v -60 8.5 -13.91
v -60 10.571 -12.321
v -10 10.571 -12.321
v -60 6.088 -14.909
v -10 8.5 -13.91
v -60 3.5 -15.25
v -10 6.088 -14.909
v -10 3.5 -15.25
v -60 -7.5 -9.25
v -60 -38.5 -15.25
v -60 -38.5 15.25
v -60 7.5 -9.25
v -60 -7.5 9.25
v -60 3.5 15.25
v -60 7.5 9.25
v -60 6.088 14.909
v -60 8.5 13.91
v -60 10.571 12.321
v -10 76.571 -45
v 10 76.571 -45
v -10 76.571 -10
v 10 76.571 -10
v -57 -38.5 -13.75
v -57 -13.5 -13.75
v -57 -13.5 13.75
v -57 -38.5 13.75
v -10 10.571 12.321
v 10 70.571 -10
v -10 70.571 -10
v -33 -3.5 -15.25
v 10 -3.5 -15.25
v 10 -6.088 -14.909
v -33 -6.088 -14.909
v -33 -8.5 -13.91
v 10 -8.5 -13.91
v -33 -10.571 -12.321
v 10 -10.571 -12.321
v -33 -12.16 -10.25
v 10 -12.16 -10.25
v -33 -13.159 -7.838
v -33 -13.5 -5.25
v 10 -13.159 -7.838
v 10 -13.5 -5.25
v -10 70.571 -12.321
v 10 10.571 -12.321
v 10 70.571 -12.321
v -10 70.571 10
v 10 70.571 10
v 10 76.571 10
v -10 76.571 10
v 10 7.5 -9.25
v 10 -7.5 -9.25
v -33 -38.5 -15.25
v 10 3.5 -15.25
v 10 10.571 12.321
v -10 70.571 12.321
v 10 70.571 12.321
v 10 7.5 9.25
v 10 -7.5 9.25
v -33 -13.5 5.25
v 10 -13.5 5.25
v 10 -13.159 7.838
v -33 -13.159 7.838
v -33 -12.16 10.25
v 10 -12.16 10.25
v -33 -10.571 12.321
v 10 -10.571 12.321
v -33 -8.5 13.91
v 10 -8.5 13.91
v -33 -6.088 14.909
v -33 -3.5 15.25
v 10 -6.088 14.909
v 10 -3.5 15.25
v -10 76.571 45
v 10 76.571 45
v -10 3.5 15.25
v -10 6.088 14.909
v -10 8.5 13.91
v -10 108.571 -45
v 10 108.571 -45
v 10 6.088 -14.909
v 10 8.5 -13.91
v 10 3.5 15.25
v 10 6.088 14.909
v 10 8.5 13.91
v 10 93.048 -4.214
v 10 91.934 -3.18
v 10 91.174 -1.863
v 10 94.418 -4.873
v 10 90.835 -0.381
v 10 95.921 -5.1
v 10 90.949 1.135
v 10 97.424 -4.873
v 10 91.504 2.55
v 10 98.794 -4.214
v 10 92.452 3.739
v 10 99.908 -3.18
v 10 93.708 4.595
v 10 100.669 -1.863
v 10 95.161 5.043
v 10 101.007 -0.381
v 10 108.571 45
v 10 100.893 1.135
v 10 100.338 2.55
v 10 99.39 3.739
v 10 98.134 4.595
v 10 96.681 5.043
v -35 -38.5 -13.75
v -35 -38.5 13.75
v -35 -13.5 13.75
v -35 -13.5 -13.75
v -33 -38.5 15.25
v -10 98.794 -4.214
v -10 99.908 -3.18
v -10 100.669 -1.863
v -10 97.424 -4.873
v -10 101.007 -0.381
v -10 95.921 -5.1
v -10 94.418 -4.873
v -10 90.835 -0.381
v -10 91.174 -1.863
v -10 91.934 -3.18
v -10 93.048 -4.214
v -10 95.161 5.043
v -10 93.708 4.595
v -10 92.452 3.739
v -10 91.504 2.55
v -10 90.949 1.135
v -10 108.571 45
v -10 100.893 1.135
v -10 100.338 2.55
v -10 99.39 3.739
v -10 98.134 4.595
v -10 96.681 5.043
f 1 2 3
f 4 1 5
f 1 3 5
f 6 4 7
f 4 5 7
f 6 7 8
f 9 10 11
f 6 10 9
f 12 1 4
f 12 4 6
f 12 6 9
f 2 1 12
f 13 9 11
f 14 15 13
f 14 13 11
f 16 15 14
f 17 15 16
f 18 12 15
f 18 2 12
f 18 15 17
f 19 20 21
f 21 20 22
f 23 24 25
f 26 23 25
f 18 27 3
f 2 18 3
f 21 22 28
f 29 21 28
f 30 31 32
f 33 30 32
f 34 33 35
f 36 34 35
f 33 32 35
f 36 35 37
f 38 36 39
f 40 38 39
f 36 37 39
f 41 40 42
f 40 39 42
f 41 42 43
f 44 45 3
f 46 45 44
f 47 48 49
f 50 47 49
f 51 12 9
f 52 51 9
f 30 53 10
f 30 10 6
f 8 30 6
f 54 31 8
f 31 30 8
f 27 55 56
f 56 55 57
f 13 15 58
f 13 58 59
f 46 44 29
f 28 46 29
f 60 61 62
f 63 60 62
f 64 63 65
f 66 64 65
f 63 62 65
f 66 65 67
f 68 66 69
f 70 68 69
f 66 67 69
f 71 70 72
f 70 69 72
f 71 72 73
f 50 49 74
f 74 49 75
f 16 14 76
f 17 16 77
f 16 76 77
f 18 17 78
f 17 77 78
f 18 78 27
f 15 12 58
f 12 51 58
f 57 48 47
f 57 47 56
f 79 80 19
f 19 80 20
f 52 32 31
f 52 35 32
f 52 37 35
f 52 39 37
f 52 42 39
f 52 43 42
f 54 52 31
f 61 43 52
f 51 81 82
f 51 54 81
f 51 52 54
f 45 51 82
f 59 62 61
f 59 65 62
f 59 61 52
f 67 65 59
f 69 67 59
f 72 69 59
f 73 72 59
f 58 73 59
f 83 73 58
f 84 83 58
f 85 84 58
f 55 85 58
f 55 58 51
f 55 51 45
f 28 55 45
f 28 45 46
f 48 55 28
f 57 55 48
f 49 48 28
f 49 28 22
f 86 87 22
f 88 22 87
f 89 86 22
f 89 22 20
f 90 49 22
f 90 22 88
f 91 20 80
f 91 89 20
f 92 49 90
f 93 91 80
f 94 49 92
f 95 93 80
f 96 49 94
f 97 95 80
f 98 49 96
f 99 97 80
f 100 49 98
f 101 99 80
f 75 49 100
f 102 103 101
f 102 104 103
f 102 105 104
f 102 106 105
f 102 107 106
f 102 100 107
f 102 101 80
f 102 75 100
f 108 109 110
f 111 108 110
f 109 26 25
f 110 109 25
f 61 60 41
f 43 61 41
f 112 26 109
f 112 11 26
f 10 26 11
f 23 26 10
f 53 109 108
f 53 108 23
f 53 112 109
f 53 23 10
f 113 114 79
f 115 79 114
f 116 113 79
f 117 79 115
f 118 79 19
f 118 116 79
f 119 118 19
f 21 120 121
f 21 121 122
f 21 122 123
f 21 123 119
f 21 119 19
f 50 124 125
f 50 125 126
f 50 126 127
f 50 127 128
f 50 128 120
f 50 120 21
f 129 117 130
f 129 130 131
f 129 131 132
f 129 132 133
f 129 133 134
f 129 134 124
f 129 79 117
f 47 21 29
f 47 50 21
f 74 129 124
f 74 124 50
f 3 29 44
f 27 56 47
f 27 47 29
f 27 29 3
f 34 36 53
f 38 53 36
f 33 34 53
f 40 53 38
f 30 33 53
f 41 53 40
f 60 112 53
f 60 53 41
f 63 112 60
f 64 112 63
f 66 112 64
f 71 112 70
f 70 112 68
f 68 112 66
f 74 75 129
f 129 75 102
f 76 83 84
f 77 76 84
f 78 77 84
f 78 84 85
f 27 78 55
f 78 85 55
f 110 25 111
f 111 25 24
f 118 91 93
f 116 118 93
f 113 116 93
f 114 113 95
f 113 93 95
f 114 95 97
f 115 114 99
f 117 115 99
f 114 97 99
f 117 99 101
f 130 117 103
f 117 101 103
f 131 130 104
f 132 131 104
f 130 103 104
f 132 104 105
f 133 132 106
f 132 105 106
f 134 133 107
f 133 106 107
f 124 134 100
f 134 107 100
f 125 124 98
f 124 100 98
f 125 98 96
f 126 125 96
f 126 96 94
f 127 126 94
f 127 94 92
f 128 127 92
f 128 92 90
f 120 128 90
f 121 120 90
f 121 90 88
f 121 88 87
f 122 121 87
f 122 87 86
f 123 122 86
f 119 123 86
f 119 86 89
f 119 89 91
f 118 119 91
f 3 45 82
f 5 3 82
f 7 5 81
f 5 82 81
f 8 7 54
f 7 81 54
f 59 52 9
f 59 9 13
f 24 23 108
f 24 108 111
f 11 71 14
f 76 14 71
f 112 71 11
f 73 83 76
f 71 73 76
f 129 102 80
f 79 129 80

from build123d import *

# Parameters (mm, degrees)
SKETCH1_W            = 15
SKETCH1_H            = 18.5
BOSS_EXTRUDE1_DEPTH  = 10
SKETCH3_W            = 60
SKETCH3_H            = 24.642135624
BOSS_EXTRUDE2_DEPTH  = 20
BOSS_EXTRUDE3_DEPTH  = 20
SKETCH5_R            = 5.1
CUT_EXTRUDE1_DEPTH   = 120.21693154
SKETCH6_W            = 15
SKETCH6_H            = 18.5
BOSS_EXTRUDE4_DEPTH  = 50
BOSS_EXTRUDE5_DEPTH  = 25
SKETCH8_W            = 3
SKETCH8_H            = 30.5
BOSS_EXTRUDE6_DEPTH  = 25
SKETCH9_W            = 25
SKETCH9_H            = 1.5
BOSS_EXTRUDE7_DEPTH  = 22
BOSS_EXTRUDE11_START = 2
BOSS_EXTRUDE11_DEPTH = 2


with BuildPart() as part:
    # Sketch1 → Boss-Extrude1 (new, symmetric)
    with BuildSketch(Plane.YZ):
        with BuildLine():
            Line((13.5, 5.25), (13.5, -5.25))
            ThreePointArc((13.5, -5.25), (10.571067812, -12.321067812), (3.5, -15.25))
            Line((3.5, -15.25), (-3.5, -15.25))
            ThreePointArc((-3.5, -15.25), (-10.571067812, -12.321067812), (-13.5, -5.25))
            Line((-13.5, -5.25), (-13.5, 5.25))
            ThreePointArc((-13.5, 5.25), (-10.571067812, 12.321067812), (-3.5, 15.25))
            Line((-3.5, 15.25), (3.5, 15.25))
            ThreePointArc((3.5, 15.25), (10.571067812, 12.321067812), (13.5, 5.25))
        make_face()
        Rectangle(SKETCH1_W, SKETCH1_H, mode=Mode.SUBTRACT)
    extrude(amount=BOSS_EXTRUDE1_DEPTH, both=True)

    # Sketch3 → Boss-Extrude2 (add)
    with BuildSketch(Plane.YZ.offset(10)):
        with Locations((40.571067812, 0)):
            Rectangle(SKETCH3_W, SKETCH3_H)
    extrude(amount=-BOSS_EXTRUDE2_DEPTH)

    # Sketch4 → Boss-Extrude3 (add)
    with BuildSketch(Plane.YZ.offset(10)):
        Polygon((70.571067812, 10), (76.571067812, 10), (76.571067812, 45), (108.571067812, 45), (108.571067812, -45), (76.571067812, -45), (76.571067812, -10), (70.571067812, -10), align=None)
    extrude(amount=-BOSS_EXTRUDE3_DEPTH)

    # Sketch5 → Cut-Extrude1 (cut, through all)
    with BuildSketch(Plane.YZ.offset(10)):
        with Locations(Location((95.921067812, 0, 0), (0, 0, 270))):
            Circle(SKETCH5_R)
    extrude(amount=-CUT_EXTRUDE1_DEPTH, mode=Mode.SUBTRACT)

    # Sketch6 → Boss-Extrude4 (add)
    with BuildSketch(Plane(origin=(-10, 0, 0), x_dir=(0, -1, 0), z_dir=(-1, 0, 0))):
        with BuildLine():
            Line((-10.571067812, 12.321067812), (-10.571067812, -12.321067812))
            ThreePointArc((-10.571067812, -12.321067812), (-7.326834324, -14.488795325), (-3.5, -15.25))
            Line((-3.5, -15.25), (3.5, -15.25))
            ThreePointArc((3.5, -15.25), (10.571067812, -12.321067812), (13.5, -5.25))
            Line((13.5, -5.25), (13.5, 5.25))
            ThreePointArc((13.5, 5.25), (10.571067812, 12.321067812), (3.5, 15.25))
            Line((3.5, 15.25), (-3.5, 15.25))
            ThreePointArc((-3.5, 15.25), (-7.326834324, 14.488795325), (-10.571067812, 12.321067812))
        make_face()
        Rectangle(SKETCH6_W, SKETCH6_H, mode=Mode.SUBTRACT)
    extrude(amount=BOSS_EXTRUDE4_DEPTH)

    # Sketch7 → Boss-Extrude5 (add)
    with BuildSketch(Plane(origin=(-60, 0, 0), x_dir=(0, -1, 0), z_dir=(-1, 0, 0))):
        Polygon((3.5, 15.25), (13.5, 15.25), (13.5, -15.25), (3.5, -15.25), (3.5, -9.25), (7.5, -9.25), (7.5, 9.25), (3.5, 9.25), align=None)
    extrude(amount=-BOSS_EXTRUDE5_DEPTH)

    # Sketch8 → Boss-Extrude6 (add)
    with BuildSketch(Plane.XZ.offset(13.5)):
        with Locations((-58.5, 0)):
            Rectangle(SKETCH8_W, SKETCH8_H)
    extrude(amount=BOSS_EXTRUDE6_DEPTH)

    # Sketch9 → Boss-Extrude7 (add)
    with BuildSketch(Plane.YZ.offset(-57)):
        with Locations((-26, 14.5)):
            Rectangle(SKETCH9_W, SKETCH9_H)
        with Locations((-26, -14.5)):
            Rectangle(SKETCH9_W, SKETCH9_H)
    extrude(amount=BOSS_EXTRUDE7_DEPTH)

    # Sketch10 → Boss-Extrude11 (add)
    with BuildSketch(Plane.YZ.offset(-35).offset(BOSS_EXTRUDE11_START)):
        with BuildLine():
            Line((-3.5, 15.25), (-38.5, 15.25))
            Line((-38.5, 15.25), (-38.5, 13.75))
            Line((-38.5, 13.75), (-13.5, 13.75))
            Line((-13.5, 13.75), (-13.5, 5.25))
            ThreePointArc((-13.5, 5.25), (-10.571067812, 12.321067812), (-3.5, 15.25))
        make_face()
        Polygon((-13.5, 13.75), (-38.5, 13.75), (-38.5, -13.75), (-13.5, -13.75), (-13.5, -5.25), (-13.5, 5.25), align=None)
        with BuildLine():
            Line((-13.5, -13.75), (-38.5, -13.75))
            Line((-38.5, -13.75), (-38.5, -15.25))
            Line((-38.5, -15.25), (-3.5, -15.25))
            ThreePointArc((-3.5, -15.25), (-10.571067812, -12.321067812), (-13.5, -5.25))
            Line((-13.5, -5.25), (-13.5, -13.75))
        make_face()
    extrude(amount=-BOSS_EXTRUDE11_DEPTH)


solid = part.part
